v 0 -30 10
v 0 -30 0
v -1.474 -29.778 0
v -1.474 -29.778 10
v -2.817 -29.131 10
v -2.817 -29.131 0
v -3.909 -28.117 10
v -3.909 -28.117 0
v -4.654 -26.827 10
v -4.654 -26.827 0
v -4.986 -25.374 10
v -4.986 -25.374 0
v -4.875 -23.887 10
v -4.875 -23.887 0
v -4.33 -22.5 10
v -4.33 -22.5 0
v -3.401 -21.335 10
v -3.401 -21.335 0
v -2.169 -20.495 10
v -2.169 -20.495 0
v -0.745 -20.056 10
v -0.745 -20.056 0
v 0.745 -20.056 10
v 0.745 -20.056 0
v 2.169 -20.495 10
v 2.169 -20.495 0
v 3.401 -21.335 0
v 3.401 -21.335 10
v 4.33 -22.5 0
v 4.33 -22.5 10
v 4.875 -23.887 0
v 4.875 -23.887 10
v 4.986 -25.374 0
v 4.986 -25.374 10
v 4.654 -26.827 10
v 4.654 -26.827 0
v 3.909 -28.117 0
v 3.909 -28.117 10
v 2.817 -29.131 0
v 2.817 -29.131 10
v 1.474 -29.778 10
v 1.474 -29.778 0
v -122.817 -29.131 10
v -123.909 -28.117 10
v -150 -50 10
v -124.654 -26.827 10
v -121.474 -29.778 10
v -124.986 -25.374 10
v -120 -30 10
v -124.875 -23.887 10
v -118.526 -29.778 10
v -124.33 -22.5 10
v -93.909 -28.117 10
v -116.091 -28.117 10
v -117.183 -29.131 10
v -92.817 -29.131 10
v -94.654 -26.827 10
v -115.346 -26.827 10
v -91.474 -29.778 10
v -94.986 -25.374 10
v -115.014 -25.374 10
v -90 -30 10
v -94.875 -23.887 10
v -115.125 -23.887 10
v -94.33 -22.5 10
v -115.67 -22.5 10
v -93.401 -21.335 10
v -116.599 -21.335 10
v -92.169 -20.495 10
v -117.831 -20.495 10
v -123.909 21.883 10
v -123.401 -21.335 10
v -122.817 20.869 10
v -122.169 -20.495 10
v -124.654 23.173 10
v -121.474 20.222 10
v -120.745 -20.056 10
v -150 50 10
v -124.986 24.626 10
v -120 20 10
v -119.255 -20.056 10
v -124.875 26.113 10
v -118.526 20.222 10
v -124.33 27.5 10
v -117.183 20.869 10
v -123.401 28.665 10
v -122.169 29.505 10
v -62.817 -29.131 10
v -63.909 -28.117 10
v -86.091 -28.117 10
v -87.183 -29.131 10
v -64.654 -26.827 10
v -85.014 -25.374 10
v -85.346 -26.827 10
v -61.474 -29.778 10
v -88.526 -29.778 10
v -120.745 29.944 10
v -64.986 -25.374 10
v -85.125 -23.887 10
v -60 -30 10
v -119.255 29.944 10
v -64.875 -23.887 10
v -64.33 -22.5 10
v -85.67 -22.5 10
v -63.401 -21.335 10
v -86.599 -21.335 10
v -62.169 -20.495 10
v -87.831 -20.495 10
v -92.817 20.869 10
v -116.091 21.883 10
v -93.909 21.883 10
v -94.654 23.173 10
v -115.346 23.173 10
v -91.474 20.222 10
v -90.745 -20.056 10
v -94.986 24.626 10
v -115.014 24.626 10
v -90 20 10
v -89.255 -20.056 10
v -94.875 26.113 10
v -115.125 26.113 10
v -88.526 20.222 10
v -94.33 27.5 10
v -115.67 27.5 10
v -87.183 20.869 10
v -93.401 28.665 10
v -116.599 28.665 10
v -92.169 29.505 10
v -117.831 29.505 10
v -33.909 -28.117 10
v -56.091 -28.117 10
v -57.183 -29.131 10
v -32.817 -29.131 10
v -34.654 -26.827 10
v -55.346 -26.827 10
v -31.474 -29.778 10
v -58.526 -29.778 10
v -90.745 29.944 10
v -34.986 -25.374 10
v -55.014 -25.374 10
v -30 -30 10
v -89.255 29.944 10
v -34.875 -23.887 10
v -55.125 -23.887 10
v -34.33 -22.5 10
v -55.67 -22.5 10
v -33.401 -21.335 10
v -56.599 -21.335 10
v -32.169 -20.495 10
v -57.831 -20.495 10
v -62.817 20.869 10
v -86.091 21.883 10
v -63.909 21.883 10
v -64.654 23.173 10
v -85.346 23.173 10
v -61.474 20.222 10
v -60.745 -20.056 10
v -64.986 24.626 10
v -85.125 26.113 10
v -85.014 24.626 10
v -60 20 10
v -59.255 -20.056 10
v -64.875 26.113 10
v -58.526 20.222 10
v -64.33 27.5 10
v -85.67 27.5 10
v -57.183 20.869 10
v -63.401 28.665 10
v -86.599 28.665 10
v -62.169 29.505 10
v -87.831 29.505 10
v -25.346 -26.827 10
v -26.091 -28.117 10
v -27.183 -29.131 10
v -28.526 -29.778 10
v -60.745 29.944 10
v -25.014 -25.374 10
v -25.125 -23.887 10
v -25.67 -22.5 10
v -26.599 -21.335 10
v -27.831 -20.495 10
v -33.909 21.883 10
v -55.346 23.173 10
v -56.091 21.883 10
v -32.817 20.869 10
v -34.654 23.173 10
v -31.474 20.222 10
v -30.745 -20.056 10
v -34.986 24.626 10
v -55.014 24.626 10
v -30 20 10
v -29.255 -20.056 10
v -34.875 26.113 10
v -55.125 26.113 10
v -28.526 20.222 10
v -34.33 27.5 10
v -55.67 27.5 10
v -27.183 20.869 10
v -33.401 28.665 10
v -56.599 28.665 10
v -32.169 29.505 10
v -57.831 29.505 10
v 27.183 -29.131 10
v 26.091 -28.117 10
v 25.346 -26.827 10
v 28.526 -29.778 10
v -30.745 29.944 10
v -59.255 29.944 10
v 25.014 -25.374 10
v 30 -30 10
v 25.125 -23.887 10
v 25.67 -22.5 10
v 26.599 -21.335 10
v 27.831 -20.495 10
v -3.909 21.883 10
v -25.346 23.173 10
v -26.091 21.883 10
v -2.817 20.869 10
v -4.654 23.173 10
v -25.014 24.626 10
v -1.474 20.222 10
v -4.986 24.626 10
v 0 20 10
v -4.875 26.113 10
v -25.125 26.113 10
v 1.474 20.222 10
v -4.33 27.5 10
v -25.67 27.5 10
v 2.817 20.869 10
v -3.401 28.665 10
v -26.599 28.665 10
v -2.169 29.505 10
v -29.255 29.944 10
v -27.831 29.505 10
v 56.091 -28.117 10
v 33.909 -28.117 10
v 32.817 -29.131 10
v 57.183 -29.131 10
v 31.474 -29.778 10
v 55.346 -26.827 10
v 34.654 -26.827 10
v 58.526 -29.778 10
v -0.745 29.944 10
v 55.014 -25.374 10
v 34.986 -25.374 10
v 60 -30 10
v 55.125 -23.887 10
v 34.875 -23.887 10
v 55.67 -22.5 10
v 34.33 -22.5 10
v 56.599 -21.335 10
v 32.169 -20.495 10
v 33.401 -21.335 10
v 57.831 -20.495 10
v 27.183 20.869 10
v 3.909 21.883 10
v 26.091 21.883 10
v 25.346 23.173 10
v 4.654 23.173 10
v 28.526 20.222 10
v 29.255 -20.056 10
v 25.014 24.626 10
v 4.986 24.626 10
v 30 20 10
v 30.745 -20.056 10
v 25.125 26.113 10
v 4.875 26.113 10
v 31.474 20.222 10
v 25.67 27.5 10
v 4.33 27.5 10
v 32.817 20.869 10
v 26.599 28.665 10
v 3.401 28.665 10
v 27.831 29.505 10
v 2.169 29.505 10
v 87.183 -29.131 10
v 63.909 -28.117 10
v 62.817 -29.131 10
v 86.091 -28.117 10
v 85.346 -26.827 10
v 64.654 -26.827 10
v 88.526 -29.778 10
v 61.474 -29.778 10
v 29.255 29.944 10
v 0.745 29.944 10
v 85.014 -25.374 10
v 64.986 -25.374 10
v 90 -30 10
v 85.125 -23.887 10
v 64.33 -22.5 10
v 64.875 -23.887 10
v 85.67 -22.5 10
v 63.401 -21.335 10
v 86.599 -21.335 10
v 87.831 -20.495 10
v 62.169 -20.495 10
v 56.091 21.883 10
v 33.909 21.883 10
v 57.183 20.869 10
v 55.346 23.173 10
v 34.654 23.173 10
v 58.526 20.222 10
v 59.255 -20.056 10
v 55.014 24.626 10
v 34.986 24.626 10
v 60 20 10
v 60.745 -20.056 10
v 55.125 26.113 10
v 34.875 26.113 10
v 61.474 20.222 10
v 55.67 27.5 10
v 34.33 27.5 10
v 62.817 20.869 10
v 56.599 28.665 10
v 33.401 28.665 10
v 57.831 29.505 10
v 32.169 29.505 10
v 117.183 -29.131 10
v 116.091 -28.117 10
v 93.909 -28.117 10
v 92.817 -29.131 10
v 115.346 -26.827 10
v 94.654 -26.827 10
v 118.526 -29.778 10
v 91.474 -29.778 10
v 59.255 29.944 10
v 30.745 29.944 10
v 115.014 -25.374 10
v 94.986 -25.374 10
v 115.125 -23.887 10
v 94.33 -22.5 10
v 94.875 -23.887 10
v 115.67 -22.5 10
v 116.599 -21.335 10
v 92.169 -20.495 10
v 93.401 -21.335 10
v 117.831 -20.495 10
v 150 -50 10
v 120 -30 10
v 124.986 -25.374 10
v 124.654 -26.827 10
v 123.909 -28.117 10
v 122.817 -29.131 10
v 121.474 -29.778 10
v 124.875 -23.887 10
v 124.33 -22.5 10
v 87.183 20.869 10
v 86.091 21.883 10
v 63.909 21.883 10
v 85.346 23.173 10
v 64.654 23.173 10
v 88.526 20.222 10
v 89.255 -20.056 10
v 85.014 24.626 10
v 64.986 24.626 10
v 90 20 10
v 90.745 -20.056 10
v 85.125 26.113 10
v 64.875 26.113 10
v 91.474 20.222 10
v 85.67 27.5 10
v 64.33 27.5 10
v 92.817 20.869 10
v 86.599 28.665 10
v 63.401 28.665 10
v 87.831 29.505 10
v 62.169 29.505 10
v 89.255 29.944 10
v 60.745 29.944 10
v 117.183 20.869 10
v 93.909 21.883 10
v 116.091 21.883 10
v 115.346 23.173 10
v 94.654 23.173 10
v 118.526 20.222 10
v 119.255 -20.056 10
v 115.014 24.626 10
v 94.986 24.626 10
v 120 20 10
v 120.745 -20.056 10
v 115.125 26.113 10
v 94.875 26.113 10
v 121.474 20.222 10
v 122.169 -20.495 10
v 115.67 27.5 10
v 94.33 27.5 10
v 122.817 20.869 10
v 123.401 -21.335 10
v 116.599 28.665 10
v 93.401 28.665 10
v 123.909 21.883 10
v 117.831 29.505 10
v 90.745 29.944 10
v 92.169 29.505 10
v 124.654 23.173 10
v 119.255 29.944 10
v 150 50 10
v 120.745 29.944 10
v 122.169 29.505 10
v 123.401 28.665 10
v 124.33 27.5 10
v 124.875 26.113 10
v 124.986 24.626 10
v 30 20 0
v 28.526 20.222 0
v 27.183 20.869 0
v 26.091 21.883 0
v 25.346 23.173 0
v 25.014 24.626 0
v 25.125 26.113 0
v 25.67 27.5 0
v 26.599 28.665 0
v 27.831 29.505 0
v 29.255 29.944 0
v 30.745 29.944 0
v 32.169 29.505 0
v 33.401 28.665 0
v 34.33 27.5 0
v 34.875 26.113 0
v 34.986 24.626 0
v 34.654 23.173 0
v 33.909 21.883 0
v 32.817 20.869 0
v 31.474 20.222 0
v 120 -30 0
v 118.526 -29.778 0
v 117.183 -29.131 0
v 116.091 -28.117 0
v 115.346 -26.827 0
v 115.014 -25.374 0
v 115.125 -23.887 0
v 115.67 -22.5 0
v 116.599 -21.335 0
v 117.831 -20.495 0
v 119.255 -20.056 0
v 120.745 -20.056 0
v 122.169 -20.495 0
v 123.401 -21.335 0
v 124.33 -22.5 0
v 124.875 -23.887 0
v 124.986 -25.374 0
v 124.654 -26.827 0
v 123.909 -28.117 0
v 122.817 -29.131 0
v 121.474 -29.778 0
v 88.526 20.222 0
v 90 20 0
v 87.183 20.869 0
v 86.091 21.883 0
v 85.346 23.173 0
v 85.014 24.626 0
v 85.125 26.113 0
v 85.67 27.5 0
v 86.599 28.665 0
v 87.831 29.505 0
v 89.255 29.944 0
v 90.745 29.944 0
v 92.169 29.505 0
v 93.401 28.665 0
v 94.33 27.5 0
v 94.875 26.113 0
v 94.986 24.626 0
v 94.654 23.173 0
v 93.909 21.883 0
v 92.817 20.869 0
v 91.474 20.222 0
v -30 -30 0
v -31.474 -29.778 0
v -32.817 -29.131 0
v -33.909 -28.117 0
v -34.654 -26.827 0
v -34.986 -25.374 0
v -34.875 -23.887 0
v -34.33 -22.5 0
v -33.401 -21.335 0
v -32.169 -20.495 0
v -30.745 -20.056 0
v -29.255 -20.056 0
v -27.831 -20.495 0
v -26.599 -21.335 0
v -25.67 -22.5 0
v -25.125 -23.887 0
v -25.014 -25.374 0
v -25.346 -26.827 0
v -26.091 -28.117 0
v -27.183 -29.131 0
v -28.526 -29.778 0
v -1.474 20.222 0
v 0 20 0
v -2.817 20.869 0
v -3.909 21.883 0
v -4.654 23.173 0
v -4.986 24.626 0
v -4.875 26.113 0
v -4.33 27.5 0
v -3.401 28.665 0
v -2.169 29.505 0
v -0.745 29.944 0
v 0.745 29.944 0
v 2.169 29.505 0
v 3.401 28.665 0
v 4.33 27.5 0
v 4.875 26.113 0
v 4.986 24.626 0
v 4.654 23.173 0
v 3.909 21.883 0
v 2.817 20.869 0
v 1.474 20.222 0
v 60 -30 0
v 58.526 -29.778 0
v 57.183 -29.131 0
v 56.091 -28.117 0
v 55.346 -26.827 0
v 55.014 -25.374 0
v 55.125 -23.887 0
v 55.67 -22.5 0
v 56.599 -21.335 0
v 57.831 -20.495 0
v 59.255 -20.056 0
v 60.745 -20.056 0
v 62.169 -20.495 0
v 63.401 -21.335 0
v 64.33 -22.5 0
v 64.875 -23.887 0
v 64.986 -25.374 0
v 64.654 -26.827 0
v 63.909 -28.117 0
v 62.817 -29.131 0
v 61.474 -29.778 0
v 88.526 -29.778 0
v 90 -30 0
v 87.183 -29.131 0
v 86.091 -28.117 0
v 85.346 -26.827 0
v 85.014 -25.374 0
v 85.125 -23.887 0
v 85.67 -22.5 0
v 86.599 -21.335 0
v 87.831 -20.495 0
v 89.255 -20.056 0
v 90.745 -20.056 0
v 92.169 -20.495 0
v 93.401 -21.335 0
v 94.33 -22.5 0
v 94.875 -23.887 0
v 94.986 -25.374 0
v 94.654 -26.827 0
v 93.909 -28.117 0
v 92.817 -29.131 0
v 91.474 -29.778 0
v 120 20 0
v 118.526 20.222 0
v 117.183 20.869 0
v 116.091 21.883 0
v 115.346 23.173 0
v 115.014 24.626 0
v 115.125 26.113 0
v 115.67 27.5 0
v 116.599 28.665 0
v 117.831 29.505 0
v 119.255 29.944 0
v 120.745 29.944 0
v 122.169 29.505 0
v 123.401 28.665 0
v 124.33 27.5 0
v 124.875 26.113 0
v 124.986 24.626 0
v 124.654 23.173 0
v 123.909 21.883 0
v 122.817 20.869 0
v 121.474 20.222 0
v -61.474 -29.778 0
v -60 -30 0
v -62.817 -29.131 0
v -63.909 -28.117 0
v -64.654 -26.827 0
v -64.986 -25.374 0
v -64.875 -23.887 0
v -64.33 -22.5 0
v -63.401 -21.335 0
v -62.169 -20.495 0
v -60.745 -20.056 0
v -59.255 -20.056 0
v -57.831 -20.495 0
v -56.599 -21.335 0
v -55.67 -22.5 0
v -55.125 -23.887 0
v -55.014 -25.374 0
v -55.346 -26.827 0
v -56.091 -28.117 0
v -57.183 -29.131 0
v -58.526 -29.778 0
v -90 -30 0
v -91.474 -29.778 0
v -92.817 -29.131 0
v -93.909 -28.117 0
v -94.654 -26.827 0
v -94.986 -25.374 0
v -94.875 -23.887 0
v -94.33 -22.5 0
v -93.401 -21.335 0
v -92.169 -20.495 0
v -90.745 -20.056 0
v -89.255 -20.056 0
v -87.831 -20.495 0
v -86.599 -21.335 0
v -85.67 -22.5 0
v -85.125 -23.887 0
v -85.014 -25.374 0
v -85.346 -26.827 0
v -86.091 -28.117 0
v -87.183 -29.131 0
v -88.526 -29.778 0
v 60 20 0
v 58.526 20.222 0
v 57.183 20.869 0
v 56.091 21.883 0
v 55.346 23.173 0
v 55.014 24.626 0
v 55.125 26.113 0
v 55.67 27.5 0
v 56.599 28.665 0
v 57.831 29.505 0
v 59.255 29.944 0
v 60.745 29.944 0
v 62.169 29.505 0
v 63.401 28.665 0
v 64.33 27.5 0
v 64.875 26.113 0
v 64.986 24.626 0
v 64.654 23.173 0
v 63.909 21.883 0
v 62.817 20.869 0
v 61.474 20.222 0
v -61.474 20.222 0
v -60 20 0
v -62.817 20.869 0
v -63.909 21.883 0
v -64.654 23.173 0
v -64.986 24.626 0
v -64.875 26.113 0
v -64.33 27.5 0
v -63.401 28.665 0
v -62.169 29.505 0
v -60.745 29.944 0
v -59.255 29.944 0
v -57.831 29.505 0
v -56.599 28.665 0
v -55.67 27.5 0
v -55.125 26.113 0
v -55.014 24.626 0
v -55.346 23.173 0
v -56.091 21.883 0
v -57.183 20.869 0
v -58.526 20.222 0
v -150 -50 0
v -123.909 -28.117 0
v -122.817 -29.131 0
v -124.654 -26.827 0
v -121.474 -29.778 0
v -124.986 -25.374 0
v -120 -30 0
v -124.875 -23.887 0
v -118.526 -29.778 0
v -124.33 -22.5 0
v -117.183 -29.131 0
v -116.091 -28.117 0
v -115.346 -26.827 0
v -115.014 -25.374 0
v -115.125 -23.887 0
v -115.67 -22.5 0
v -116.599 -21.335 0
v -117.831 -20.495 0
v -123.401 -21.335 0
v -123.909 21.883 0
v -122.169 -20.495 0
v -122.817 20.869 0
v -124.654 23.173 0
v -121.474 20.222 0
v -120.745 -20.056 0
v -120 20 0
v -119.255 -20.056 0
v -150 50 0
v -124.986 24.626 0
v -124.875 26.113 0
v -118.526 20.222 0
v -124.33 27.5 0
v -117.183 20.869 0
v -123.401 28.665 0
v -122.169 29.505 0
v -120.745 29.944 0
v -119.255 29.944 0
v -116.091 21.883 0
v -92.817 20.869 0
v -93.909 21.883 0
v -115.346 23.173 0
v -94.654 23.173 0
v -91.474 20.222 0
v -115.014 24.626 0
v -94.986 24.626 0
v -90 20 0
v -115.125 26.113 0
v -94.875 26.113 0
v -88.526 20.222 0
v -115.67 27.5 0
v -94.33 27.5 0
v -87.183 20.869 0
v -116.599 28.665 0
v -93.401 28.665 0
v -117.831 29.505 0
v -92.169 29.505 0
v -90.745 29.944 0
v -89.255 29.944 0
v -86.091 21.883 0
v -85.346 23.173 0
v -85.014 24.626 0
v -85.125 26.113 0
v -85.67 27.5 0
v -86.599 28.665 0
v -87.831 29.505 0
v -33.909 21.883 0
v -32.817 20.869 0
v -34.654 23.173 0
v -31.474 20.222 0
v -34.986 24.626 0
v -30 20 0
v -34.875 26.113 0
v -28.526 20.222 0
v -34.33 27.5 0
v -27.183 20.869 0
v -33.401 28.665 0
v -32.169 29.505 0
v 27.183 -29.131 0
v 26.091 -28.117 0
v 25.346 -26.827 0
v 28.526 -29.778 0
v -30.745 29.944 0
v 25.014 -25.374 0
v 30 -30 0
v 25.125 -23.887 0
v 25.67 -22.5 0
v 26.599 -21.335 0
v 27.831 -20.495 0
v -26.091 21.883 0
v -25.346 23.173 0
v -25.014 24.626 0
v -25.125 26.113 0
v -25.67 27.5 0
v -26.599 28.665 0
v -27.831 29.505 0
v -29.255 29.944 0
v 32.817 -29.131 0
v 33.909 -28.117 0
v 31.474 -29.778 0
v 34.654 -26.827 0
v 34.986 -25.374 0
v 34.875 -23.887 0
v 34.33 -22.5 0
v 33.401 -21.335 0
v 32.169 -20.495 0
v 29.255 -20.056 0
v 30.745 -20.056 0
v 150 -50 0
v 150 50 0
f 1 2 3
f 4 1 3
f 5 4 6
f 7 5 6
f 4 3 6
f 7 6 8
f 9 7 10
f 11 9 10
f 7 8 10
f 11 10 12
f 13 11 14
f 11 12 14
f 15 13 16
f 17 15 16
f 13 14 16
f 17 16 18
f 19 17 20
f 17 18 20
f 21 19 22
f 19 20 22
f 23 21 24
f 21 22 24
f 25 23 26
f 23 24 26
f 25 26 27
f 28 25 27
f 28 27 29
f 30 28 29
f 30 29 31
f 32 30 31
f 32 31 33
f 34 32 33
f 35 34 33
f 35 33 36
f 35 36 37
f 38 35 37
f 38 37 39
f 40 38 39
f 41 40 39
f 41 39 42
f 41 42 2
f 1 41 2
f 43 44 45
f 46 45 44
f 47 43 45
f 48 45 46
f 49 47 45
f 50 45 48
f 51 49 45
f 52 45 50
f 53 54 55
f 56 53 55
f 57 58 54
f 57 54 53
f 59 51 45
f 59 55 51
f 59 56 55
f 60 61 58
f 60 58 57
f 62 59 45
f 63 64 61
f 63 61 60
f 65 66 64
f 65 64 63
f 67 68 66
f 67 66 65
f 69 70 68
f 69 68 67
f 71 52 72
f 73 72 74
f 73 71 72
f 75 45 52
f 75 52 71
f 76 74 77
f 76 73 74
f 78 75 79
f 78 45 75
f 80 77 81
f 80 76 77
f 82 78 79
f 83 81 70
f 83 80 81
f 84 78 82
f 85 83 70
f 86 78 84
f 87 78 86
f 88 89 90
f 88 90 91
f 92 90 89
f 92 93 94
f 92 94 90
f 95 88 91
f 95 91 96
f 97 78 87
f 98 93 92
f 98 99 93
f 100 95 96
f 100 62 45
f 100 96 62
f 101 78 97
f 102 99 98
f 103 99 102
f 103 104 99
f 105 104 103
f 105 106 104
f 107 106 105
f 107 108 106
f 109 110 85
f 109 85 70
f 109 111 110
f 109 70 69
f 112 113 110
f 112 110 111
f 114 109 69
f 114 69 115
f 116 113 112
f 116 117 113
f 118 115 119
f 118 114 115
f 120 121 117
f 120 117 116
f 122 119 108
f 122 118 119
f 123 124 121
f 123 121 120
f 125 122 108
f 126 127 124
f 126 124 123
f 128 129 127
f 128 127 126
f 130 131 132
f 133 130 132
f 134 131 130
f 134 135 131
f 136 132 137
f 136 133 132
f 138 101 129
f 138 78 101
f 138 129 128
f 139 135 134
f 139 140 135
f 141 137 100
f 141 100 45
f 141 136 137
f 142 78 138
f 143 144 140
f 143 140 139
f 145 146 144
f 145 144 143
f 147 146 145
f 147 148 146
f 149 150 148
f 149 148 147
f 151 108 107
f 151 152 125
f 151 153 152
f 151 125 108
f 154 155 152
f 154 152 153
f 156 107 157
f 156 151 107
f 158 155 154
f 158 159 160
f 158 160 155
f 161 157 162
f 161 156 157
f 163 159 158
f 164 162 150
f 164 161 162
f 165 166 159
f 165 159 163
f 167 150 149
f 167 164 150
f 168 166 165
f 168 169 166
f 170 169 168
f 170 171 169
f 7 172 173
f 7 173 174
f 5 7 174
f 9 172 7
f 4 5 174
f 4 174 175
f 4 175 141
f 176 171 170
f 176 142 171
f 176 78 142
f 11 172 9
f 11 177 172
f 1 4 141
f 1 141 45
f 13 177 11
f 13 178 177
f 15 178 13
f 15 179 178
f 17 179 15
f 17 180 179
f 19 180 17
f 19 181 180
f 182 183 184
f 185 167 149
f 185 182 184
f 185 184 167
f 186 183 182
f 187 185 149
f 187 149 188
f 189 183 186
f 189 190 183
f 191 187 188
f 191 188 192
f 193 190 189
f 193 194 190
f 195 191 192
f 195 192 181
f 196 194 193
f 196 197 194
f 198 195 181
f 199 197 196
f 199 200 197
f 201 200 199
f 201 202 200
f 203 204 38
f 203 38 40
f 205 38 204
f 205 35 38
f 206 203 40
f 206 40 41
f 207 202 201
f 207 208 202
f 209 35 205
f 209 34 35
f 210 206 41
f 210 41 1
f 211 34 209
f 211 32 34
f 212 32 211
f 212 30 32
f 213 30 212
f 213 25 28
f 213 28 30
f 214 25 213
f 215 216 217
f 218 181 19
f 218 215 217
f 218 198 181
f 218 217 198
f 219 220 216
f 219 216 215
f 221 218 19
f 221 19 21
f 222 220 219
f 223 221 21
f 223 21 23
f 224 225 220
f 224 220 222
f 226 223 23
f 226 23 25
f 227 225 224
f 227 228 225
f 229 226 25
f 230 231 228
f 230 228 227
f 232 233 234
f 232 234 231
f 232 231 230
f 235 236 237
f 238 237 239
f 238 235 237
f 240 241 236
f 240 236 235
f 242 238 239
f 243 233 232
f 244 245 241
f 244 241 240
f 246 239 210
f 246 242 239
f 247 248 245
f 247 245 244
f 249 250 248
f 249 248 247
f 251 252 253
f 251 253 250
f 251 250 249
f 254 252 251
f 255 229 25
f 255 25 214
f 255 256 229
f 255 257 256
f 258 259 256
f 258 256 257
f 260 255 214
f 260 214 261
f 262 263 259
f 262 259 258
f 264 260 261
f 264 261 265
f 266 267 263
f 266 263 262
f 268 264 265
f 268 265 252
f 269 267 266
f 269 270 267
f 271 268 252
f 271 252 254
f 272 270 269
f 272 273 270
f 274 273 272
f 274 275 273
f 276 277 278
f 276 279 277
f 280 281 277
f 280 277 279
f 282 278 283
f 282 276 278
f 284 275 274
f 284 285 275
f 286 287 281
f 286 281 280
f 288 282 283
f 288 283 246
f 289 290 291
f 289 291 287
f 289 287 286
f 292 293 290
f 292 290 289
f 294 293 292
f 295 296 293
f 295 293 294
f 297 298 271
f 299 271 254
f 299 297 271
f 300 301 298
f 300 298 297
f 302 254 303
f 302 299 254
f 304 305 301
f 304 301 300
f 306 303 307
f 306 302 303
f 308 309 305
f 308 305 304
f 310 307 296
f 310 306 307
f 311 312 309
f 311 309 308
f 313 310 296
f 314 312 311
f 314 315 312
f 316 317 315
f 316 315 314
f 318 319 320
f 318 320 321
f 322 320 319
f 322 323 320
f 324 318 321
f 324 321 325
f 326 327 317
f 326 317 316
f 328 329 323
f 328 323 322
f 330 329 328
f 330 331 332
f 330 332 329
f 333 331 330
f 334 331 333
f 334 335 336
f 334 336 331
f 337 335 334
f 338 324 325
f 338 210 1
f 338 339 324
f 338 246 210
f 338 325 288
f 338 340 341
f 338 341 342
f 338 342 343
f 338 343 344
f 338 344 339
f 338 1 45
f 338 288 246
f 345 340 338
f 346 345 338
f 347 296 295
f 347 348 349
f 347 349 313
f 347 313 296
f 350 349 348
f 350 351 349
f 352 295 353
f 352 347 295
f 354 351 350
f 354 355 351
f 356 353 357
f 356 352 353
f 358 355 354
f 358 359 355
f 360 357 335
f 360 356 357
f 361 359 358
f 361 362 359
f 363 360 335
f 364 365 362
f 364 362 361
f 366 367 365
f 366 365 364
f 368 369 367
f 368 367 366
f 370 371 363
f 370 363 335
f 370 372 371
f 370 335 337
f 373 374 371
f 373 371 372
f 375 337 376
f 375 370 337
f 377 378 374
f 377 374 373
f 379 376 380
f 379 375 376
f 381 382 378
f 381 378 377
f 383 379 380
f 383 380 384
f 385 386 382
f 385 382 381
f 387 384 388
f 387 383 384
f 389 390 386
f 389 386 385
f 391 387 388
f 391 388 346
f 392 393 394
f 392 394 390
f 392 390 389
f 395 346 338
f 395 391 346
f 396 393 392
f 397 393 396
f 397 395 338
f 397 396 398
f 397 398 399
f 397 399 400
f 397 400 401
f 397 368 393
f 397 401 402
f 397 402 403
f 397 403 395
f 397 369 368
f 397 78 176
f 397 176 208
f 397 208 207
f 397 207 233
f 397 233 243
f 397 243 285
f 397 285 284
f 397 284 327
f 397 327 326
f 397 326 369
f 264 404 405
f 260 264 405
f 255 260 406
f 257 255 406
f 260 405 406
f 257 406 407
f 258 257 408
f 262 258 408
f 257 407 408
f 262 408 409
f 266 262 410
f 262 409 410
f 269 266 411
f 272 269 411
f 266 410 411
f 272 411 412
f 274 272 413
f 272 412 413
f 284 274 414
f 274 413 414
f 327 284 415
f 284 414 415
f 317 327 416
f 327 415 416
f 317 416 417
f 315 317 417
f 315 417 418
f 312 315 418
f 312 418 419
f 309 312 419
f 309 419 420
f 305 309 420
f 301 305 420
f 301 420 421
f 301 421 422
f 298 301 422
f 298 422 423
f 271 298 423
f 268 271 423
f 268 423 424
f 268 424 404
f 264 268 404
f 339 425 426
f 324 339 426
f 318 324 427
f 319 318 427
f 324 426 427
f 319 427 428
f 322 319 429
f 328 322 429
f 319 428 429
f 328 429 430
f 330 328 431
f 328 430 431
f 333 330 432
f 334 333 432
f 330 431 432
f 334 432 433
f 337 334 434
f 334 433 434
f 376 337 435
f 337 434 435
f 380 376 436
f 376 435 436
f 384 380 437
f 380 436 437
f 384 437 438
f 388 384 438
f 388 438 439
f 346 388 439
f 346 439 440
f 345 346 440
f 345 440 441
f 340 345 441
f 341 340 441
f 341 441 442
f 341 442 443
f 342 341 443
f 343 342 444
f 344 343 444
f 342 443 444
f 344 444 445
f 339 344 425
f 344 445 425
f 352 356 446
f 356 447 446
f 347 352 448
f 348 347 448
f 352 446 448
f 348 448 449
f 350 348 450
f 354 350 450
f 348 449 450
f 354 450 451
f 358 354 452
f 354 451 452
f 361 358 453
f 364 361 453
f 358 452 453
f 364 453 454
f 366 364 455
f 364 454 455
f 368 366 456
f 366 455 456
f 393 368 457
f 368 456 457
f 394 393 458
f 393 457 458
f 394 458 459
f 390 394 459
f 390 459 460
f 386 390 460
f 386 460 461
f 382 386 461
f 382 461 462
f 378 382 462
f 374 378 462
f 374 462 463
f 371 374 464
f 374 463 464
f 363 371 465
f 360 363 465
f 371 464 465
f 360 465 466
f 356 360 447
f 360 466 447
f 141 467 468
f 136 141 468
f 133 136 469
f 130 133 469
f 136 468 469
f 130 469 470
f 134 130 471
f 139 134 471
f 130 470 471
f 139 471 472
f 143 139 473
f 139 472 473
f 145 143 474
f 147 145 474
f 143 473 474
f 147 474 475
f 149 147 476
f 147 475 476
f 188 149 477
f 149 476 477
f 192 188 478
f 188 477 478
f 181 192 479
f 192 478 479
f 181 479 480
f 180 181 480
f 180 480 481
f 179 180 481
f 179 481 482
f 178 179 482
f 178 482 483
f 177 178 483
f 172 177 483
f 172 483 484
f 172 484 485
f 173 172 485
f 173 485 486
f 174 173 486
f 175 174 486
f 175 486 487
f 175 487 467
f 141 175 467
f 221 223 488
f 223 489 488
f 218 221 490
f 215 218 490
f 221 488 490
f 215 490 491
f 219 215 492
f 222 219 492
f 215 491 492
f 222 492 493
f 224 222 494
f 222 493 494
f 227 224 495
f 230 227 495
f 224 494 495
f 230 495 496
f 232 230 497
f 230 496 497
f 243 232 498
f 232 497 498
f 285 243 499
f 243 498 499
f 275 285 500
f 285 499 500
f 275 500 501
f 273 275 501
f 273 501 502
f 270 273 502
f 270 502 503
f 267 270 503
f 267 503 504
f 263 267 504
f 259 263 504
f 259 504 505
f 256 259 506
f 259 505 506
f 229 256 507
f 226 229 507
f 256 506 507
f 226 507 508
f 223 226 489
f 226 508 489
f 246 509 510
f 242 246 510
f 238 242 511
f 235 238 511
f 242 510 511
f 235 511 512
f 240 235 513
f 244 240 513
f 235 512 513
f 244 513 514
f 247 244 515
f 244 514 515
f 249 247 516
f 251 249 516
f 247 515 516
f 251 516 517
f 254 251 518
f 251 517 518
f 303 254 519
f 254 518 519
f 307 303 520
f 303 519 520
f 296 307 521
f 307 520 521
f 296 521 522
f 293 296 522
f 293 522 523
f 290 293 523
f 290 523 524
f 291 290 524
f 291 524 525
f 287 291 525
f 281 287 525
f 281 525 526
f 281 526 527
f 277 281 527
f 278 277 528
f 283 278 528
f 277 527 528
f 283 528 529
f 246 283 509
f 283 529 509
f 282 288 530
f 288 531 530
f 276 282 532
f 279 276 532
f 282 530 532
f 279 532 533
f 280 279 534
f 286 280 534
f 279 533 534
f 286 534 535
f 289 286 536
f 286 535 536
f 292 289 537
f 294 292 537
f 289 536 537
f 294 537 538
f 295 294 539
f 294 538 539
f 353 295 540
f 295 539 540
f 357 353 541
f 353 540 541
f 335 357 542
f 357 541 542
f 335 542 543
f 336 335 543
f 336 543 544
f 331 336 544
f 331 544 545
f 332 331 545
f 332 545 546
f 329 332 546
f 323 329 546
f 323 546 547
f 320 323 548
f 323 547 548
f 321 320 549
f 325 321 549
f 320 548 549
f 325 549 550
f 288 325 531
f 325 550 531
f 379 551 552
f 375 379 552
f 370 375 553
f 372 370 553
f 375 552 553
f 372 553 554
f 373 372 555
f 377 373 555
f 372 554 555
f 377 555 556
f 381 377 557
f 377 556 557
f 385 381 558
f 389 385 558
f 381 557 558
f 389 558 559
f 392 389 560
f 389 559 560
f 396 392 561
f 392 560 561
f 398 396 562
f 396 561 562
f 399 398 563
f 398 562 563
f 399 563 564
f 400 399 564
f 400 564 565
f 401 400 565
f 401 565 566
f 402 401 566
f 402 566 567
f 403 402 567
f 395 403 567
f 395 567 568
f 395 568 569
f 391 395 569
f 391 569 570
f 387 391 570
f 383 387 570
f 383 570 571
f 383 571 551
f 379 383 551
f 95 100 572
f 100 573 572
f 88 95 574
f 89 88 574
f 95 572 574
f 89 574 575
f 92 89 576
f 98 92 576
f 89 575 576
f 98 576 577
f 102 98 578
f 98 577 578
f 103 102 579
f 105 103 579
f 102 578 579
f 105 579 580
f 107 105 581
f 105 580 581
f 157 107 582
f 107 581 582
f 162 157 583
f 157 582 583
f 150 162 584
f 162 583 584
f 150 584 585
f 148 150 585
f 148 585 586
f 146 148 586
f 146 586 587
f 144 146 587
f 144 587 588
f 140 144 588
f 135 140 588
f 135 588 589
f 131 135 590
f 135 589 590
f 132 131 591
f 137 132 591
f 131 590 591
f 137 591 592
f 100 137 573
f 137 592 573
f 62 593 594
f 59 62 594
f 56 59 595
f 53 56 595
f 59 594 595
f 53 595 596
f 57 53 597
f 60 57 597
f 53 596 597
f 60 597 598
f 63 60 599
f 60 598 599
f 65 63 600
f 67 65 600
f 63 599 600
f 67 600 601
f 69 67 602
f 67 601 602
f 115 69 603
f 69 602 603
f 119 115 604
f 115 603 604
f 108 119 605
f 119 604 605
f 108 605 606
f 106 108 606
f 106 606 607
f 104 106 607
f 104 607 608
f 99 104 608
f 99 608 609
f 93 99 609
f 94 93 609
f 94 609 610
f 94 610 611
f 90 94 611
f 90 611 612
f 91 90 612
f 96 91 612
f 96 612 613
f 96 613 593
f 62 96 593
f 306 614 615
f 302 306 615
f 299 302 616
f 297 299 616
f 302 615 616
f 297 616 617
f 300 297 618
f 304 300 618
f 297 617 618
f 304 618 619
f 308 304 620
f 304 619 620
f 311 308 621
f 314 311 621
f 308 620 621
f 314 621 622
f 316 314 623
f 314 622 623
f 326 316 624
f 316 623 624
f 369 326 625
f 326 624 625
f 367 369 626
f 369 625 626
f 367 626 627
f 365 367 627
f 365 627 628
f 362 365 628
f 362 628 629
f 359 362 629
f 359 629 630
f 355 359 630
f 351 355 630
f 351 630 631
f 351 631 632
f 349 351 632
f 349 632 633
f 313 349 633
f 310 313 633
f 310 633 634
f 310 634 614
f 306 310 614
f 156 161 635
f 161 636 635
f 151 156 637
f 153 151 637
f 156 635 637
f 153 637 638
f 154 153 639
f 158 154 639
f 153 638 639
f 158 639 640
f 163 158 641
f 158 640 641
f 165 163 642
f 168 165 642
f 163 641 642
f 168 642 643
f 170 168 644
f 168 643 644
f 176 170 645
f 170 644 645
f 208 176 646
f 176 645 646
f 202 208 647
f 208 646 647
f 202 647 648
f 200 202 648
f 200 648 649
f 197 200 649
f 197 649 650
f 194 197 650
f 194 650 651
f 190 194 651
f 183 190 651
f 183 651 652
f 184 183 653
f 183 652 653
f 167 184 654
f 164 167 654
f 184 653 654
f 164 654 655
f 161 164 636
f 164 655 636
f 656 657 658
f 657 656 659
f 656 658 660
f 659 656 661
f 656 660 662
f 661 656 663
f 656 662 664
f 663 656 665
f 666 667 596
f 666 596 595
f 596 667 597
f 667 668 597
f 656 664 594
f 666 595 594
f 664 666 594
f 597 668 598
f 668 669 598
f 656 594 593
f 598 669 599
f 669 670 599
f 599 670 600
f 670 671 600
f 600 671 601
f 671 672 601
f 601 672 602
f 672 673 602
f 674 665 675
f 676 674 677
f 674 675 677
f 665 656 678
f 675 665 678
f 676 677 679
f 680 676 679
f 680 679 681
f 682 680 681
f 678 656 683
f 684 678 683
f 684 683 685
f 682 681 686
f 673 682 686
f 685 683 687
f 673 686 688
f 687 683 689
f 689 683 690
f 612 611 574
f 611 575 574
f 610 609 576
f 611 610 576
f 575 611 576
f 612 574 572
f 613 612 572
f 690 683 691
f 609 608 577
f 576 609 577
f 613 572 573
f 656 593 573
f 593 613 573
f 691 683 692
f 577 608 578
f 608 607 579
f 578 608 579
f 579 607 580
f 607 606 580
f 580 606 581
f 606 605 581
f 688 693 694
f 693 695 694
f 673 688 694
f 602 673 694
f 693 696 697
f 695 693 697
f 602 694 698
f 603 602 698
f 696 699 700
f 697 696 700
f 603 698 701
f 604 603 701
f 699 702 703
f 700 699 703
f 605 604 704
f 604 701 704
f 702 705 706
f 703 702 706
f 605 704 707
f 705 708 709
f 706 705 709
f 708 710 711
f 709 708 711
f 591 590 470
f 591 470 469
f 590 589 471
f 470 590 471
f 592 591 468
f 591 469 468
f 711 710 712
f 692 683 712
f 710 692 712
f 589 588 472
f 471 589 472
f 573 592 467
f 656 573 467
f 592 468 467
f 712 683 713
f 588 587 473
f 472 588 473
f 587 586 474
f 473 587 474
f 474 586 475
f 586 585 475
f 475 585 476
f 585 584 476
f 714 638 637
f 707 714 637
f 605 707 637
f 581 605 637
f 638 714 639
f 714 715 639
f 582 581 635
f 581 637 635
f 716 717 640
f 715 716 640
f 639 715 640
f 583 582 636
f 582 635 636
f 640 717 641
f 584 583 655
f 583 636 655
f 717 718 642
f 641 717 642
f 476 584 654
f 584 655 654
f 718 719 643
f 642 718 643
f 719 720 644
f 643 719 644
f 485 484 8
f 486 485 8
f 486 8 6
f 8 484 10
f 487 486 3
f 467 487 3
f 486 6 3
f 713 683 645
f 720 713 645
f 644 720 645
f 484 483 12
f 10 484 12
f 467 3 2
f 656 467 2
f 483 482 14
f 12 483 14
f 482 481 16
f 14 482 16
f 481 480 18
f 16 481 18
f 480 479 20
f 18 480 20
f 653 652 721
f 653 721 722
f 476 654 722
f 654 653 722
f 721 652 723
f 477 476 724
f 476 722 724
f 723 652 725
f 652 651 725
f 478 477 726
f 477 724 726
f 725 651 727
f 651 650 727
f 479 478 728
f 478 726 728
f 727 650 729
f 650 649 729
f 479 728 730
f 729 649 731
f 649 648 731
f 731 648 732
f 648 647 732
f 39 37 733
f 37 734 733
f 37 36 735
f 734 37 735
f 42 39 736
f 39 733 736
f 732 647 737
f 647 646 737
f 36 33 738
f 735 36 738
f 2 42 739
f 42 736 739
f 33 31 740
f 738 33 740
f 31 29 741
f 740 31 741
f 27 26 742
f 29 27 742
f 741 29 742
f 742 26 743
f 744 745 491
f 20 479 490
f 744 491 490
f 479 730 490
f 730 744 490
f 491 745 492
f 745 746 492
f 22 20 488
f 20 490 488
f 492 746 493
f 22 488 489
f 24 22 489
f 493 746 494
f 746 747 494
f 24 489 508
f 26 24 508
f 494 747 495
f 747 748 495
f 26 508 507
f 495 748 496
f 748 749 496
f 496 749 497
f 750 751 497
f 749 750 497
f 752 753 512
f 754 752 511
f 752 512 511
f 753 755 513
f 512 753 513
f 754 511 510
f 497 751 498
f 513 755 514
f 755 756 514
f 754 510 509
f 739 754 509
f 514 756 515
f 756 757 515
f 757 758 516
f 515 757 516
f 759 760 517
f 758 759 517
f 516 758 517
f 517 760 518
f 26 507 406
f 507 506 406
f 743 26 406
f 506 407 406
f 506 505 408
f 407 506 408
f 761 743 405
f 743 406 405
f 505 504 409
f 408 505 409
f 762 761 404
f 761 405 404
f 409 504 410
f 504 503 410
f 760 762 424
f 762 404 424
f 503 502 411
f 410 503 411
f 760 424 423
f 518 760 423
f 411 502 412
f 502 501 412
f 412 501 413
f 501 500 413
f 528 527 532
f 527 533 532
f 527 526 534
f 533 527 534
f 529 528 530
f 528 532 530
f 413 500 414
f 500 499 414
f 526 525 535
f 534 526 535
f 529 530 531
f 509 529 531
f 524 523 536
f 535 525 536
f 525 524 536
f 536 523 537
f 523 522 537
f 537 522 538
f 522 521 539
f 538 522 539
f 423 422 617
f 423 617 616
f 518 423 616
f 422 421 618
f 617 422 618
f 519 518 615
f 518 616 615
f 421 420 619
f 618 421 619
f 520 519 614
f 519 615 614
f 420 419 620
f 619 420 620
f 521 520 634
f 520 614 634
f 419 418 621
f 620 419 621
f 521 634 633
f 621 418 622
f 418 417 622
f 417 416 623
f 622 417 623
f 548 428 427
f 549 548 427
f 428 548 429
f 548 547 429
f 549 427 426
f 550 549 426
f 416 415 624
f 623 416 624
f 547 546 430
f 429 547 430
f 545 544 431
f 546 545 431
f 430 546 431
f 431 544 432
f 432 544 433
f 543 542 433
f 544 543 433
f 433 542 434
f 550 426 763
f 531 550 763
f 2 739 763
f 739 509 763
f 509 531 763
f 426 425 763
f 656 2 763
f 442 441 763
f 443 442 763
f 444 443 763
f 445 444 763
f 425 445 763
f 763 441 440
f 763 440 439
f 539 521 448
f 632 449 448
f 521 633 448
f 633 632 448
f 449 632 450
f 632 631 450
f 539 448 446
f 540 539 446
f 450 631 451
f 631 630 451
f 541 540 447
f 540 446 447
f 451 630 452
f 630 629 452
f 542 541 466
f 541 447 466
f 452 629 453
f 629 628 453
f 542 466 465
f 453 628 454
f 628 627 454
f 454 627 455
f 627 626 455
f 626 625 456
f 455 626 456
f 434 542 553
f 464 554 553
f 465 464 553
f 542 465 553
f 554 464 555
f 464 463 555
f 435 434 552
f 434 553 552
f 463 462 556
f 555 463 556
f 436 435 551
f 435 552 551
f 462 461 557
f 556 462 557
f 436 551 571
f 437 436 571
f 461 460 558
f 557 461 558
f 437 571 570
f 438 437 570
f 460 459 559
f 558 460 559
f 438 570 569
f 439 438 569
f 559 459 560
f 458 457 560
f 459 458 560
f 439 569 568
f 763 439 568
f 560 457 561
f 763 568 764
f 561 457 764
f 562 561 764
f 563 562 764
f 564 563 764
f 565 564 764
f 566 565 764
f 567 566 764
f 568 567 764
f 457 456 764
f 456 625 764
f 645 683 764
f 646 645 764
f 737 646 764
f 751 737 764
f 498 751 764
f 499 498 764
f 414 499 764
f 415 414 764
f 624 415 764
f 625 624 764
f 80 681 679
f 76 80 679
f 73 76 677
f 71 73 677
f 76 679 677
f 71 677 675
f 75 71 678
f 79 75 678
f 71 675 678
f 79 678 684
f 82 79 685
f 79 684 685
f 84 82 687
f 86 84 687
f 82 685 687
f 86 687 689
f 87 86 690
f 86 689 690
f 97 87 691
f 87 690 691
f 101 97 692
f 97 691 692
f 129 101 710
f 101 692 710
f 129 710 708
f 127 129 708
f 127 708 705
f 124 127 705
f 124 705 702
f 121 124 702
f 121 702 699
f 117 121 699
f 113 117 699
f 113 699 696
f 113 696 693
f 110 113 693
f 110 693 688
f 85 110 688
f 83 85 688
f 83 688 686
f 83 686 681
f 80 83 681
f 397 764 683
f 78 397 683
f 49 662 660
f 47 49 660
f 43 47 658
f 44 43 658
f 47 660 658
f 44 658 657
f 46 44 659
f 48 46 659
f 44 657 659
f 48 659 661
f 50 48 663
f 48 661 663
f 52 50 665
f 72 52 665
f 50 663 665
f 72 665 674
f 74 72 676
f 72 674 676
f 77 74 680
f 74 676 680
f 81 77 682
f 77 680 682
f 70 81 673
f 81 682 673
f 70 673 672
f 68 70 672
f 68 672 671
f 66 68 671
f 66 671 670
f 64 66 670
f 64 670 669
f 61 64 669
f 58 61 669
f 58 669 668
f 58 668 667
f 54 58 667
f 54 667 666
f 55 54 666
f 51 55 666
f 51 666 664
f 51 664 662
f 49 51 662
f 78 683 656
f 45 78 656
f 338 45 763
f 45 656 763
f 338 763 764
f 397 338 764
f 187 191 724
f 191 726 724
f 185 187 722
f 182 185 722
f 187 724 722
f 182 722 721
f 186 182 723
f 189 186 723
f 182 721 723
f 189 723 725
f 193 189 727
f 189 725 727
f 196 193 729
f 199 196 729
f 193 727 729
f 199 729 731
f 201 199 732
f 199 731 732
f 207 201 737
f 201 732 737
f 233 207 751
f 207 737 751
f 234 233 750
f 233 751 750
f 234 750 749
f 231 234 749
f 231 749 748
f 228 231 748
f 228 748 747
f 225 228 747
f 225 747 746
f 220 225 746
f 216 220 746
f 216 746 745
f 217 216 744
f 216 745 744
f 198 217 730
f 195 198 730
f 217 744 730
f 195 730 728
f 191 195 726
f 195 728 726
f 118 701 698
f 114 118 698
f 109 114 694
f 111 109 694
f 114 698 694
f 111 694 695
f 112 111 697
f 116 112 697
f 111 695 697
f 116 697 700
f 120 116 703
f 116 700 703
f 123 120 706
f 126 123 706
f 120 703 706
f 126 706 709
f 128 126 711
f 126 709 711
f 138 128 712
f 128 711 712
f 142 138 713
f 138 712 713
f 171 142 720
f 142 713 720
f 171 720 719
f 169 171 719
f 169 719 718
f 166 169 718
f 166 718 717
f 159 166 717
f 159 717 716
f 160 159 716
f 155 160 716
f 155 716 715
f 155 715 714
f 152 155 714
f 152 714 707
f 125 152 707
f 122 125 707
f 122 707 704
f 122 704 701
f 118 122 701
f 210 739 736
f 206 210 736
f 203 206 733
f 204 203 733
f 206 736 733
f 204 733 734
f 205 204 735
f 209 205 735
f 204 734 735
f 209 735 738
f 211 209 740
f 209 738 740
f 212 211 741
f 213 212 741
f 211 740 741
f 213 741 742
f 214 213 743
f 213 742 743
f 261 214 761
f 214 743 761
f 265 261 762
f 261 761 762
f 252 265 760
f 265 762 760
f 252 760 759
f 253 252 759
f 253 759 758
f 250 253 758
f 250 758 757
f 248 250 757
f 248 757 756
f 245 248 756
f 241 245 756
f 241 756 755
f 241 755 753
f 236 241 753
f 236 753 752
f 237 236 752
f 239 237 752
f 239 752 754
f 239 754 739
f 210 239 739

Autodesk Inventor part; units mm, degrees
ref_plane "YZ Plane" through (0, 0, 0) normal (1, 0, 0) x (0, 1, 0)
ref_plane "XZ Plane" through (0, 0, 0) normal (0, 1, 0) x (-1, 0, 0)
ref_plane "XY Plane" through (0, 0, 0) normal (0, 0, 1) x (1, 0, 0)
sketch "Skizze1" plane through (0, 0, 0) normal (0, 0, 1) x (1, 0, 0)
  line L0 (-150, -50) -> (150, -50)
  line L1 (150, -50) -> (150, 50)
  line L2 (150, 50) -> (-150, 50)
  line L3 (-150, 50) -> (-150, -50)
  line L4 (-210, 0) -> (210, 0) projected
  line L5 (0, -70) -> (0, 70) projected
  point P0 (0, 0)
  dimension "d0" = 300
  dimension "d1" = 100
extrude "Extrusion1" add sketch "Skizze1" along normal blind 10
sketch "Skizze2" plane through (0, 0, 10) normal (0, 0, 1) x (1, 0, 0)
  line L0 (-210, 0) -> (210, 0) projected
  line L1 (0, -70) -> (0, 70) projected
  line L2 (-150, 50) -> (-150, -50) projected
  point P0 (0, 0)
  point P1 (-120, -25)
  dimension "d4" = 25
  dimension "d5" = 30
hole "Bohrung1" at (-120, -25, 10) direction (0, 0, -1) diameter 10 end through all
pattern_linear "Rechteckige Anordnung1" count 9 spacing 30 along (1, 0, 0) count 2 spacing 50 along (0, 1, 0) of "Bohrung1"
properties part number "Lochplatte"
